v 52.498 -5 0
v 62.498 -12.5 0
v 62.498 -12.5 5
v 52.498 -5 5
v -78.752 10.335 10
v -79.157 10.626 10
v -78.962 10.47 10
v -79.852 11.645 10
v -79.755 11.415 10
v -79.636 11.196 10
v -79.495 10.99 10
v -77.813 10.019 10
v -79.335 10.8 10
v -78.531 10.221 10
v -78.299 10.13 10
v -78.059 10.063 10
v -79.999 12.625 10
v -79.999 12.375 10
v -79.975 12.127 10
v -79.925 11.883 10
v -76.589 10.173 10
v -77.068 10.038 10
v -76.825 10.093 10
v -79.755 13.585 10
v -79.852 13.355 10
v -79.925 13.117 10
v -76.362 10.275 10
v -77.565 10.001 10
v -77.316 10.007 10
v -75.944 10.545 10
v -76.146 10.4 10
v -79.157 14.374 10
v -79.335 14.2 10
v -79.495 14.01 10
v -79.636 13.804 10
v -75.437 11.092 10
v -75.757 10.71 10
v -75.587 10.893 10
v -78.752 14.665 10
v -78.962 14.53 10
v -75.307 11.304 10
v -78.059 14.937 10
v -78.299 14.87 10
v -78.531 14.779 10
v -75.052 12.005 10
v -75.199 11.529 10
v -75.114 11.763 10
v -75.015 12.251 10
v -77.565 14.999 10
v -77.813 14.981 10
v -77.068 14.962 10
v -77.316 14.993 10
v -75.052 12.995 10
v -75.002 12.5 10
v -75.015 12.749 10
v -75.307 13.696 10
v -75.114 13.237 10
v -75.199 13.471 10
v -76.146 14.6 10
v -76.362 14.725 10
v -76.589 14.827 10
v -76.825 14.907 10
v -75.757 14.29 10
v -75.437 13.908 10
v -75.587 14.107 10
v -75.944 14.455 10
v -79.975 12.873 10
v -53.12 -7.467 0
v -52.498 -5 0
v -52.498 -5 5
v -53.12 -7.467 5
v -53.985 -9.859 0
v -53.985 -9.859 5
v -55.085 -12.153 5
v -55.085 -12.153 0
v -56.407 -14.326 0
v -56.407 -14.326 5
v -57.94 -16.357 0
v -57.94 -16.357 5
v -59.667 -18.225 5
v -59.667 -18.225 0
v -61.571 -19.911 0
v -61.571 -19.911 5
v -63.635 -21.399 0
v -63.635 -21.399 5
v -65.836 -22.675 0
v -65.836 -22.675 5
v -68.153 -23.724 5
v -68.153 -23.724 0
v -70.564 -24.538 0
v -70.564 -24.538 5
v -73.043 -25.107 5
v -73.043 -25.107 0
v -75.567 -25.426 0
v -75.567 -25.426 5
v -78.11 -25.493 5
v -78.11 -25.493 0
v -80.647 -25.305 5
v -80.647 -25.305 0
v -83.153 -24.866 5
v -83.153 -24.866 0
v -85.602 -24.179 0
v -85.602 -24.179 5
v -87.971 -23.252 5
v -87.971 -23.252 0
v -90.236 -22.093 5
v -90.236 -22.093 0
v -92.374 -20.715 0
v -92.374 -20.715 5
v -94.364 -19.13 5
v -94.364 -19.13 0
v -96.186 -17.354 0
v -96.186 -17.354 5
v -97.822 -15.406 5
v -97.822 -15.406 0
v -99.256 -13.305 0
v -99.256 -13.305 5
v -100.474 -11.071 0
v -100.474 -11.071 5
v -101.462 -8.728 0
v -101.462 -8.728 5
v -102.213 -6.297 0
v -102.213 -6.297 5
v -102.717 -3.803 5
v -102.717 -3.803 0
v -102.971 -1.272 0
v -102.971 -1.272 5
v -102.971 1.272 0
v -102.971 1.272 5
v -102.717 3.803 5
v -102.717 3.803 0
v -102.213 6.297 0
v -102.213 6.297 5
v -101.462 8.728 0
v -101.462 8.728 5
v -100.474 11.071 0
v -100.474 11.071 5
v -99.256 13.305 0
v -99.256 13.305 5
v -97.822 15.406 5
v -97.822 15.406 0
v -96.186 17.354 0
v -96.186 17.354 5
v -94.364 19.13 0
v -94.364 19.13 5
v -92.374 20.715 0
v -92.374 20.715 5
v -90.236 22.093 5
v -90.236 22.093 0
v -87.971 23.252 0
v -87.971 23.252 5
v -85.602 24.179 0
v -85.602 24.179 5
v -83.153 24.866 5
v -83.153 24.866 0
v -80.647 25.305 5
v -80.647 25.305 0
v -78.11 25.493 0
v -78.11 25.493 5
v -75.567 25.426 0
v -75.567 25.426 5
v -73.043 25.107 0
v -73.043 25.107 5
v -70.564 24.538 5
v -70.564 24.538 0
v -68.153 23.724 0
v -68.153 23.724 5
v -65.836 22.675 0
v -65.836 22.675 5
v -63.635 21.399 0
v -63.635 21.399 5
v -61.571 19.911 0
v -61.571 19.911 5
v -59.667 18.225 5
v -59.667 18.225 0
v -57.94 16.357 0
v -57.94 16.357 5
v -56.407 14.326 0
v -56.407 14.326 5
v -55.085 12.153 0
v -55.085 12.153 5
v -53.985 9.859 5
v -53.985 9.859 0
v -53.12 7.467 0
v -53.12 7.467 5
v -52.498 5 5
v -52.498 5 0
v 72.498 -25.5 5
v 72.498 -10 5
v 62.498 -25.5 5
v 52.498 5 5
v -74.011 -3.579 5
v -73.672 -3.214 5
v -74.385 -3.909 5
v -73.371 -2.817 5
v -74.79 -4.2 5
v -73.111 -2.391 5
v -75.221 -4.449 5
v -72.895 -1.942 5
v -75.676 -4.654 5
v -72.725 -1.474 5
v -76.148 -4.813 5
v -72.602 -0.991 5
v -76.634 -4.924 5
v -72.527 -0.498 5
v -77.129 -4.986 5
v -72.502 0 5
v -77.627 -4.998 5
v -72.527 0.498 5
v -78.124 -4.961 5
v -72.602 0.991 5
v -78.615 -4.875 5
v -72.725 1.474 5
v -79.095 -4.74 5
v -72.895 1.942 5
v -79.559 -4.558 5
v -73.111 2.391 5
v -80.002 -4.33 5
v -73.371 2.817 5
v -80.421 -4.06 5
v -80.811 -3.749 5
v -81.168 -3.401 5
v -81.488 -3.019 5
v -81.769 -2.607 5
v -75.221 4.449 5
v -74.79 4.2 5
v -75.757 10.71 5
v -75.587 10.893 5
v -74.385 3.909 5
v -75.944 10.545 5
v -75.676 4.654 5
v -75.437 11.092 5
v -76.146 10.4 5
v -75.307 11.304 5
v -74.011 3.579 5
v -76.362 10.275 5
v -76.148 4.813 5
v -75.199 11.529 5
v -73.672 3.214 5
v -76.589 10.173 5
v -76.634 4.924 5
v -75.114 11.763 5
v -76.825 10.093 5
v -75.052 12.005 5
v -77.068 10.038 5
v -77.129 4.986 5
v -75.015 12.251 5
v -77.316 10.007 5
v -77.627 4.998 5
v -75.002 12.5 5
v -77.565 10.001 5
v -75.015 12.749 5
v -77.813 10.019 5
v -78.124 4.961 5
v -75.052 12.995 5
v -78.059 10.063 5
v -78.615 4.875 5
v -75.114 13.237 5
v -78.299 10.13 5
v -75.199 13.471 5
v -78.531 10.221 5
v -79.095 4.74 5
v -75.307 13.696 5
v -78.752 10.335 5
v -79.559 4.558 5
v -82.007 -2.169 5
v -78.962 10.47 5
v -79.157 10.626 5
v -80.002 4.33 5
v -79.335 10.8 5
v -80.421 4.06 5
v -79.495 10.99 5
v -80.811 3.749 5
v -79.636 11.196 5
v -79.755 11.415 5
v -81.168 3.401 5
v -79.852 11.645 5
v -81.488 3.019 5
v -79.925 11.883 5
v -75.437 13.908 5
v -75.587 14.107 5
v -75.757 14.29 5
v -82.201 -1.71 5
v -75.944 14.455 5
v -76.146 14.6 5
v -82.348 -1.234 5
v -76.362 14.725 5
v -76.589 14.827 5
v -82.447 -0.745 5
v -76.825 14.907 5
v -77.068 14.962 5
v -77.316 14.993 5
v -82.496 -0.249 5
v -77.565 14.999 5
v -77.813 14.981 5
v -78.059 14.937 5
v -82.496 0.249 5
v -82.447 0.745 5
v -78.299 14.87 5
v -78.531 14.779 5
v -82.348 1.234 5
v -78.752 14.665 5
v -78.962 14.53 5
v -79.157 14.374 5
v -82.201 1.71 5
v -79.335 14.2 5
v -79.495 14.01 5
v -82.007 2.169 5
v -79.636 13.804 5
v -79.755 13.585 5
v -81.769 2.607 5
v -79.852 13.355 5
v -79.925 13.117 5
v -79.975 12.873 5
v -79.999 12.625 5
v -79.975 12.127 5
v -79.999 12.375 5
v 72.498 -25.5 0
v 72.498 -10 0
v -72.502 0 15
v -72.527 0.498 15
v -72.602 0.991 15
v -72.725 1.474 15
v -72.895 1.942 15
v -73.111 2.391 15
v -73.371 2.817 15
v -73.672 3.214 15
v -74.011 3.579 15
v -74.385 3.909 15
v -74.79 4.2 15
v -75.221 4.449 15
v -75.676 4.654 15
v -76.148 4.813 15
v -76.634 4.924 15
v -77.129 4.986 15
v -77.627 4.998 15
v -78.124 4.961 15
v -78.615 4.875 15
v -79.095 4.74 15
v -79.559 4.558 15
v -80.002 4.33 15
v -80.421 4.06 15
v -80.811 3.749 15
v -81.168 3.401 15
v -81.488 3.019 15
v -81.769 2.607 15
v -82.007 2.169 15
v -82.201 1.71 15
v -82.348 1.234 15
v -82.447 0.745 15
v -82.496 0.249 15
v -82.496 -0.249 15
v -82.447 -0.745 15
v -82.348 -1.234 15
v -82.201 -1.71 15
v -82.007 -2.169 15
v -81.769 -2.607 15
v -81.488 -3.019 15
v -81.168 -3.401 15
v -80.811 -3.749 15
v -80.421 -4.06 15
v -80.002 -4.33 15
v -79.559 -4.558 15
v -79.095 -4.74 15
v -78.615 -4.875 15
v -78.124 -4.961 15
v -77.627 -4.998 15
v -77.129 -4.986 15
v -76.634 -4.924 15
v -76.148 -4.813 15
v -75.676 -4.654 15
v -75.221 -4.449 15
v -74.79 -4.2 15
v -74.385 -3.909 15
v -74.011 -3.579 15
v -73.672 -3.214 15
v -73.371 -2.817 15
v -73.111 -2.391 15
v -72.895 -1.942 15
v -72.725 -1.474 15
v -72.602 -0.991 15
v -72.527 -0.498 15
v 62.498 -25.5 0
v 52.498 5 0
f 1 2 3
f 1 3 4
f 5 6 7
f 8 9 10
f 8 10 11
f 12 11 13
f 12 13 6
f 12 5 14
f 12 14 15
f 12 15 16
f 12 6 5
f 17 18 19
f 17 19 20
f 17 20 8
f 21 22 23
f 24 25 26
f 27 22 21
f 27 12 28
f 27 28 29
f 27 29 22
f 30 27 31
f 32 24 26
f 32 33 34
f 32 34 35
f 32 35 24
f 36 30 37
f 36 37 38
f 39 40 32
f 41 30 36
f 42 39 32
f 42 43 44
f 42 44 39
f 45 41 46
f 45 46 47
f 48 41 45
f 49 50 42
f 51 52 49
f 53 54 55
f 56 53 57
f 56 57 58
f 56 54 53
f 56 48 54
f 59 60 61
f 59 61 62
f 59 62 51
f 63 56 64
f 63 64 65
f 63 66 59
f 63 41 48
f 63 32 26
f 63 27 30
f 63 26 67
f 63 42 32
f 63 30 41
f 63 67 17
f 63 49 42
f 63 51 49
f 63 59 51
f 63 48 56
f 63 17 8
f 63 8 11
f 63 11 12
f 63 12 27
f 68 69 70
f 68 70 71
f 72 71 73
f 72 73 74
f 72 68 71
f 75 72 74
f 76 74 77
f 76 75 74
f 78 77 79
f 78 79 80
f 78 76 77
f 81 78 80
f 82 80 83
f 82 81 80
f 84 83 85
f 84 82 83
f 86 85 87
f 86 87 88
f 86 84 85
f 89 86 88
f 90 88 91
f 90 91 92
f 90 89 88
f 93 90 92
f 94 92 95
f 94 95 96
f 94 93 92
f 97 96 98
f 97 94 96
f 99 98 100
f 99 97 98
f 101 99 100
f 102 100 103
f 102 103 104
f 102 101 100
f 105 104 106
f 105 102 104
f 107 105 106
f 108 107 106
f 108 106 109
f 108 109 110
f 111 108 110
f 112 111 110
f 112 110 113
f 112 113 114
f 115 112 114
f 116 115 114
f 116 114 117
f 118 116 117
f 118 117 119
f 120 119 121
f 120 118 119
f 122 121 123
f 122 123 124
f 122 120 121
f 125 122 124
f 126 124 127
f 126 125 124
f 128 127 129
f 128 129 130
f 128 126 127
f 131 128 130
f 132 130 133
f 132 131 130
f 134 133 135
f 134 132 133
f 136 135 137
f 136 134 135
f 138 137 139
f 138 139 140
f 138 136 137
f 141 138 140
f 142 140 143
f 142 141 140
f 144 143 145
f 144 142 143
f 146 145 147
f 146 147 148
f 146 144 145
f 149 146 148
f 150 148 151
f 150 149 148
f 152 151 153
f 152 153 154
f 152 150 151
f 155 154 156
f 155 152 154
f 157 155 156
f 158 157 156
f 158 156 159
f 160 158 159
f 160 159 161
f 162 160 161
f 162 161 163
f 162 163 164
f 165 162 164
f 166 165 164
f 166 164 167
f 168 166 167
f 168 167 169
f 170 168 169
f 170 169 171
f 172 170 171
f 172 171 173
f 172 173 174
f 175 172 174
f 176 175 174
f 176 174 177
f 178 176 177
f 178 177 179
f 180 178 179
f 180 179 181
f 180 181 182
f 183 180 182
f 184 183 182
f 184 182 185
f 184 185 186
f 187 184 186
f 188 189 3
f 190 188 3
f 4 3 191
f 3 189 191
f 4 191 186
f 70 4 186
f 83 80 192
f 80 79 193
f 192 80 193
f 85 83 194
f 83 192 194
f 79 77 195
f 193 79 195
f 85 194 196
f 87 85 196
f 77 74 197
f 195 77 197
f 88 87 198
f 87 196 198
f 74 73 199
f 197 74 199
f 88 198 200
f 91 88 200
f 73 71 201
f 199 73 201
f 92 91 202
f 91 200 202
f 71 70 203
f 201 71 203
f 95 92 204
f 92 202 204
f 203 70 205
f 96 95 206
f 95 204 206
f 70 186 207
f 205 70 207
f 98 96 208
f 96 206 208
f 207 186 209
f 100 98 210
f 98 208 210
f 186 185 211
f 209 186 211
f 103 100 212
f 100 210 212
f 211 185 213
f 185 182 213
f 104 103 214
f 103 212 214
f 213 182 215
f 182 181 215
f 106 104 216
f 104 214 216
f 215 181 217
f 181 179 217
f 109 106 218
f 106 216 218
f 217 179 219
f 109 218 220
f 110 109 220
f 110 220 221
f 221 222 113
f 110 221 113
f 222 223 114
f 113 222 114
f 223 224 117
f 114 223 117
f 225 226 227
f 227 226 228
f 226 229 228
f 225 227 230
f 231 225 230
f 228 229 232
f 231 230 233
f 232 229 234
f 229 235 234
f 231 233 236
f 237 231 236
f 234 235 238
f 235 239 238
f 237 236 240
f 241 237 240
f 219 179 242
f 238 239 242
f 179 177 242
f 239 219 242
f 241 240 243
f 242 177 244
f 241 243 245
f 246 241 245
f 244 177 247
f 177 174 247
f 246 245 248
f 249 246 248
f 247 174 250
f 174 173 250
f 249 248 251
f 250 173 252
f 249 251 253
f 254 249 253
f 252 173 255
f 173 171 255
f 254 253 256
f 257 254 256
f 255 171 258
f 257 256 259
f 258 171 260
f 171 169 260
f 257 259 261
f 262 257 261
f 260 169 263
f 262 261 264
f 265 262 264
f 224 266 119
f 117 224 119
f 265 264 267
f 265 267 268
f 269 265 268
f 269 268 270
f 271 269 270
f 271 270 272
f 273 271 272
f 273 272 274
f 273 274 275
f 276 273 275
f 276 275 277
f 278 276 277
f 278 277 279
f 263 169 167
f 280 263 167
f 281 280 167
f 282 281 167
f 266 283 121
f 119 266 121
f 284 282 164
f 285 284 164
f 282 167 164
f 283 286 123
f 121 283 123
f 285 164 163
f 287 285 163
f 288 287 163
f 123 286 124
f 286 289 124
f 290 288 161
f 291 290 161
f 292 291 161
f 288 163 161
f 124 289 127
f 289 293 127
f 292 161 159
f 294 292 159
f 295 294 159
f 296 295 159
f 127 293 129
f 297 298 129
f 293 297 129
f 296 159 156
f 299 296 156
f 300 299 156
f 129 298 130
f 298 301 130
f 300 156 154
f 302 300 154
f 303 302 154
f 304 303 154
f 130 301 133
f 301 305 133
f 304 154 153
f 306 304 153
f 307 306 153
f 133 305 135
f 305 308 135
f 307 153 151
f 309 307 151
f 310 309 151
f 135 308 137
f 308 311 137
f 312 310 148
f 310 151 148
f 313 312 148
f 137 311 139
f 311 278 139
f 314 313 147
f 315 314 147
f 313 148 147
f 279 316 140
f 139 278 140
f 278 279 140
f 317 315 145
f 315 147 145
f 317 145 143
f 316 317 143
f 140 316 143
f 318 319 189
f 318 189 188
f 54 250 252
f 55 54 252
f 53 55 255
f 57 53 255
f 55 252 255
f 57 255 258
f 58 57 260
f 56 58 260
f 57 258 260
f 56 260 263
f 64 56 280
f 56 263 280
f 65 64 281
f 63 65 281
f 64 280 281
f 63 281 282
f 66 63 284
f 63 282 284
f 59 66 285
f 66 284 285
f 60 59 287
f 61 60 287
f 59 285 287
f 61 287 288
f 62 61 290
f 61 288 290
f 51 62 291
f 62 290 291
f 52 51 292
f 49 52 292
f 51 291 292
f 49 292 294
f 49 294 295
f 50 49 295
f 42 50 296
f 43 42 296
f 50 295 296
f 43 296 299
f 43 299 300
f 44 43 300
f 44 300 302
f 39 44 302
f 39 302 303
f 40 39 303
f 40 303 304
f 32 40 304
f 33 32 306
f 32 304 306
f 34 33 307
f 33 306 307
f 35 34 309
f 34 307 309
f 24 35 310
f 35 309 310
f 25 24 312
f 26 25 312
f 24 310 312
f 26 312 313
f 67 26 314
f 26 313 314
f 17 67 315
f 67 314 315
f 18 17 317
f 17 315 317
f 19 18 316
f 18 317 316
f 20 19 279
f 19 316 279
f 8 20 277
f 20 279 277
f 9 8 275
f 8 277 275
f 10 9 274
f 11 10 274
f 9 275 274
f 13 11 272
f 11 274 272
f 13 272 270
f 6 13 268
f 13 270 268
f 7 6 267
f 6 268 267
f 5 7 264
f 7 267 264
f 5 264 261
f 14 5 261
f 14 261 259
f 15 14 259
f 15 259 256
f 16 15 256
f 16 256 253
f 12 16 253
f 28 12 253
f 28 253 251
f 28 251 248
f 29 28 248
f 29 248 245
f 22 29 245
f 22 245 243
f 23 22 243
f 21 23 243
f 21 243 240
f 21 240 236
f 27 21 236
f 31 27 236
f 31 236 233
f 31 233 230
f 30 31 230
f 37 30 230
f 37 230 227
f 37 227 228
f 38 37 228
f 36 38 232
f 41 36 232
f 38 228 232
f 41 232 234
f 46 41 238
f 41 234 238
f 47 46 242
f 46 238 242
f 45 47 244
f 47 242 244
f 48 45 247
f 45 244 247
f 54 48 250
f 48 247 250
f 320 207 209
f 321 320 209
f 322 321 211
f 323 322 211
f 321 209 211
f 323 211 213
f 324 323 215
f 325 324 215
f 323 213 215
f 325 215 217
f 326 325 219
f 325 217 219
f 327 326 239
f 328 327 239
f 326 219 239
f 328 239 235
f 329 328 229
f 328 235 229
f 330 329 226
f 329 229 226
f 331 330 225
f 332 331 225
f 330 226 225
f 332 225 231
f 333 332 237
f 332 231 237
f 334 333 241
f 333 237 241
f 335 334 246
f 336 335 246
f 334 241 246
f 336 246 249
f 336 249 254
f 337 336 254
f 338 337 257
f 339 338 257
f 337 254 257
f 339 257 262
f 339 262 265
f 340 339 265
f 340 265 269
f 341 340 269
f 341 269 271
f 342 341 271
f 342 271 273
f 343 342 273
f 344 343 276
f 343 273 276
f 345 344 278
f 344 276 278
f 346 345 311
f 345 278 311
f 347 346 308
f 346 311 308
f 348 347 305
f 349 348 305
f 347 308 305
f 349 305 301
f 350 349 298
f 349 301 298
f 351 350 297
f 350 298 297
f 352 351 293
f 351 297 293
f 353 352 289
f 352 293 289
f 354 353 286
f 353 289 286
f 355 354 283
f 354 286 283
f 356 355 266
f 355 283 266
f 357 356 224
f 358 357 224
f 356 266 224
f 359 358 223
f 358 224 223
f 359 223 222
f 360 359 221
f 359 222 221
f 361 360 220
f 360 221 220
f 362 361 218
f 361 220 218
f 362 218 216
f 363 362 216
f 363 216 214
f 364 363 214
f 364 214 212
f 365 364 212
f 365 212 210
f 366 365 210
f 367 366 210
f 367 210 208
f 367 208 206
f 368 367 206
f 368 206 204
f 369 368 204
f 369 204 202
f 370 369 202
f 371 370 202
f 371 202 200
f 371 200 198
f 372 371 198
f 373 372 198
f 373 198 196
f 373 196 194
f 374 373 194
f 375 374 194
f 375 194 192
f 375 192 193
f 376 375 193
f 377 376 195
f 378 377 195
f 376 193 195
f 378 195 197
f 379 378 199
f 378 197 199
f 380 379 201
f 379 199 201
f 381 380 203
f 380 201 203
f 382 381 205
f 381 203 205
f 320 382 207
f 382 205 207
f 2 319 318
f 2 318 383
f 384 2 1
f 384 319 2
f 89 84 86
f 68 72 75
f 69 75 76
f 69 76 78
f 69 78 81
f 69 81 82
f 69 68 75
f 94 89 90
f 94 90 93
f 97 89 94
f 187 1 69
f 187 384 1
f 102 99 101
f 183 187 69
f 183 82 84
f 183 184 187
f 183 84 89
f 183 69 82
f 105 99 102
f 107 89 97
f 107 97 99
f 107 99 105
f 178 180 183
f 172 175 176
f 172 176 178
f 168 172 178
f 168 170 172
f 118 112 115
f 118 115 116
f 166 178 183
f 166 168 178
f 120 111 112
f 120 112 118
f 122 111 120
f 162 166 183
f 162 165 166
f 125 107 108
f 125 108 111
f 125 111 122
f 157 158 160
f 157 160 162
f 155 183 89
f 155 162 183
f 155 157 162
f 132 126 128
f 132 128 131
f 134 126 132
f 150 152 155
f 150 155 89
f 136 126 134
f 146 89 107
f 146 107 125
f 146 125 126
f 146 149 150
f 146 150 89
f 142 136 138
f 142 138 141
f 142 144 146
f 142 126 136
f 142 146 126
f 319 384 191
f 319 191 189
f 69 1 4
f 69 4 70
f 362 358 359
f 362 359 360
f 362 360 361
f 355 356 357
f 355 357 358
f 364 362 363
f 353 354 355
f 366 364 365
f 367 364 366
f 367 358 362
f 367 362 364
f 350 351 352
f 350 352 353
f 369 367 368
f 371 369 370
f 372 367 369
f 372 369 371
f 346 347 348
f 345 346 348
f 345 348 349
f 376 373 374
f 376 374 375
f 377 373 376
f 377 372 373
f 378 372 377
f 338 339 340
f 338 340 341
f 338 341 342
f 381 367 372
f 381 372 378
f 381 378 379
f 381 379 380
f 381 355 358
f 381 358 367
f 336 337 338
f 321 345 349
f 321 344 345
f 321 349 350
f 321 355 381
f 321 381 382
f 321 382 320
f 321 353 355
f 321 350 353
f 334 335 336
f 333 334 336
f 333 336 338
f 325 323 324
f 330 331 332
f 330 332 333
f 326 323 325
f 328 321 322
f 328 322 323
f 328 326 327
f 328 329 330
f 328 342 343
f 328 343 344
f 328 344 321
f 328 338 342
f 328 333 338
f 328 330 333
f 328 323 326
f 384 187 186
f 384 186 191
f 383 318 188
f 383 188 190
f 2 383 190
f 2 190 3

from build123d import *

# Parameters (mm, degrees)
SALIENTE_EXTRUIR1_DEPTH = 5
CROQUIS2_R              = 2.5
SALIENTE_EXTRUIR2_DEPTH = 5
CROQUIS3_R              = 5
SALIENTE_EXTRUIR3_DEPTH = 10


with BuildPart() as part:
    # Croquis1 → Saliente-Extruir1 (new body)
    with BuildSketch(Plane.XY):
        with BuildLine():
            Line((-52.49750025, 5), (52.49750025, 5))
            Line((52.49750025, 5), (72.49750025, -10))
            Line((72.49750025, -10), (72.49750025, -25.5))
            Line((72.49750025, -25.5), (62.49750025, -25.5))
            Line((62.49750025, -25.5), (62.49750025, -12.5))
            Line((62.49750025, -12.5), (52.49750025, -5))
            Line((52.49750025, -5), (-52.49750025, -5))
            ThreePointArc((-52.49750025, -5), (-103.00249975, 0), (-52.49750025, 5))
        make_face()
    extrude(amount=SALIENTE_EXTRUIR1_DEPTH)

    # Croquis2 → Saliente-Extruir2 (add)
    with BuildSketch(Plane.XY.offset(5)):
        with Locations((-77.50249975, 12.5)):
            Circle(CROQUIS2_R)
    extrude(amount=SALIENTE_EXTRUIR2_DEPTH)

    # Croquis3 → Saliente-Extruir3 (add)
    with BuildSketch(Plane.XY.offset(5)):
        with Locations((-77.50249975, 0)):
            Circle(CROQUIS3_R)
    extrude(amount=SALIENTE_EXTRUIR3_DEPTH)


solid = part.part
